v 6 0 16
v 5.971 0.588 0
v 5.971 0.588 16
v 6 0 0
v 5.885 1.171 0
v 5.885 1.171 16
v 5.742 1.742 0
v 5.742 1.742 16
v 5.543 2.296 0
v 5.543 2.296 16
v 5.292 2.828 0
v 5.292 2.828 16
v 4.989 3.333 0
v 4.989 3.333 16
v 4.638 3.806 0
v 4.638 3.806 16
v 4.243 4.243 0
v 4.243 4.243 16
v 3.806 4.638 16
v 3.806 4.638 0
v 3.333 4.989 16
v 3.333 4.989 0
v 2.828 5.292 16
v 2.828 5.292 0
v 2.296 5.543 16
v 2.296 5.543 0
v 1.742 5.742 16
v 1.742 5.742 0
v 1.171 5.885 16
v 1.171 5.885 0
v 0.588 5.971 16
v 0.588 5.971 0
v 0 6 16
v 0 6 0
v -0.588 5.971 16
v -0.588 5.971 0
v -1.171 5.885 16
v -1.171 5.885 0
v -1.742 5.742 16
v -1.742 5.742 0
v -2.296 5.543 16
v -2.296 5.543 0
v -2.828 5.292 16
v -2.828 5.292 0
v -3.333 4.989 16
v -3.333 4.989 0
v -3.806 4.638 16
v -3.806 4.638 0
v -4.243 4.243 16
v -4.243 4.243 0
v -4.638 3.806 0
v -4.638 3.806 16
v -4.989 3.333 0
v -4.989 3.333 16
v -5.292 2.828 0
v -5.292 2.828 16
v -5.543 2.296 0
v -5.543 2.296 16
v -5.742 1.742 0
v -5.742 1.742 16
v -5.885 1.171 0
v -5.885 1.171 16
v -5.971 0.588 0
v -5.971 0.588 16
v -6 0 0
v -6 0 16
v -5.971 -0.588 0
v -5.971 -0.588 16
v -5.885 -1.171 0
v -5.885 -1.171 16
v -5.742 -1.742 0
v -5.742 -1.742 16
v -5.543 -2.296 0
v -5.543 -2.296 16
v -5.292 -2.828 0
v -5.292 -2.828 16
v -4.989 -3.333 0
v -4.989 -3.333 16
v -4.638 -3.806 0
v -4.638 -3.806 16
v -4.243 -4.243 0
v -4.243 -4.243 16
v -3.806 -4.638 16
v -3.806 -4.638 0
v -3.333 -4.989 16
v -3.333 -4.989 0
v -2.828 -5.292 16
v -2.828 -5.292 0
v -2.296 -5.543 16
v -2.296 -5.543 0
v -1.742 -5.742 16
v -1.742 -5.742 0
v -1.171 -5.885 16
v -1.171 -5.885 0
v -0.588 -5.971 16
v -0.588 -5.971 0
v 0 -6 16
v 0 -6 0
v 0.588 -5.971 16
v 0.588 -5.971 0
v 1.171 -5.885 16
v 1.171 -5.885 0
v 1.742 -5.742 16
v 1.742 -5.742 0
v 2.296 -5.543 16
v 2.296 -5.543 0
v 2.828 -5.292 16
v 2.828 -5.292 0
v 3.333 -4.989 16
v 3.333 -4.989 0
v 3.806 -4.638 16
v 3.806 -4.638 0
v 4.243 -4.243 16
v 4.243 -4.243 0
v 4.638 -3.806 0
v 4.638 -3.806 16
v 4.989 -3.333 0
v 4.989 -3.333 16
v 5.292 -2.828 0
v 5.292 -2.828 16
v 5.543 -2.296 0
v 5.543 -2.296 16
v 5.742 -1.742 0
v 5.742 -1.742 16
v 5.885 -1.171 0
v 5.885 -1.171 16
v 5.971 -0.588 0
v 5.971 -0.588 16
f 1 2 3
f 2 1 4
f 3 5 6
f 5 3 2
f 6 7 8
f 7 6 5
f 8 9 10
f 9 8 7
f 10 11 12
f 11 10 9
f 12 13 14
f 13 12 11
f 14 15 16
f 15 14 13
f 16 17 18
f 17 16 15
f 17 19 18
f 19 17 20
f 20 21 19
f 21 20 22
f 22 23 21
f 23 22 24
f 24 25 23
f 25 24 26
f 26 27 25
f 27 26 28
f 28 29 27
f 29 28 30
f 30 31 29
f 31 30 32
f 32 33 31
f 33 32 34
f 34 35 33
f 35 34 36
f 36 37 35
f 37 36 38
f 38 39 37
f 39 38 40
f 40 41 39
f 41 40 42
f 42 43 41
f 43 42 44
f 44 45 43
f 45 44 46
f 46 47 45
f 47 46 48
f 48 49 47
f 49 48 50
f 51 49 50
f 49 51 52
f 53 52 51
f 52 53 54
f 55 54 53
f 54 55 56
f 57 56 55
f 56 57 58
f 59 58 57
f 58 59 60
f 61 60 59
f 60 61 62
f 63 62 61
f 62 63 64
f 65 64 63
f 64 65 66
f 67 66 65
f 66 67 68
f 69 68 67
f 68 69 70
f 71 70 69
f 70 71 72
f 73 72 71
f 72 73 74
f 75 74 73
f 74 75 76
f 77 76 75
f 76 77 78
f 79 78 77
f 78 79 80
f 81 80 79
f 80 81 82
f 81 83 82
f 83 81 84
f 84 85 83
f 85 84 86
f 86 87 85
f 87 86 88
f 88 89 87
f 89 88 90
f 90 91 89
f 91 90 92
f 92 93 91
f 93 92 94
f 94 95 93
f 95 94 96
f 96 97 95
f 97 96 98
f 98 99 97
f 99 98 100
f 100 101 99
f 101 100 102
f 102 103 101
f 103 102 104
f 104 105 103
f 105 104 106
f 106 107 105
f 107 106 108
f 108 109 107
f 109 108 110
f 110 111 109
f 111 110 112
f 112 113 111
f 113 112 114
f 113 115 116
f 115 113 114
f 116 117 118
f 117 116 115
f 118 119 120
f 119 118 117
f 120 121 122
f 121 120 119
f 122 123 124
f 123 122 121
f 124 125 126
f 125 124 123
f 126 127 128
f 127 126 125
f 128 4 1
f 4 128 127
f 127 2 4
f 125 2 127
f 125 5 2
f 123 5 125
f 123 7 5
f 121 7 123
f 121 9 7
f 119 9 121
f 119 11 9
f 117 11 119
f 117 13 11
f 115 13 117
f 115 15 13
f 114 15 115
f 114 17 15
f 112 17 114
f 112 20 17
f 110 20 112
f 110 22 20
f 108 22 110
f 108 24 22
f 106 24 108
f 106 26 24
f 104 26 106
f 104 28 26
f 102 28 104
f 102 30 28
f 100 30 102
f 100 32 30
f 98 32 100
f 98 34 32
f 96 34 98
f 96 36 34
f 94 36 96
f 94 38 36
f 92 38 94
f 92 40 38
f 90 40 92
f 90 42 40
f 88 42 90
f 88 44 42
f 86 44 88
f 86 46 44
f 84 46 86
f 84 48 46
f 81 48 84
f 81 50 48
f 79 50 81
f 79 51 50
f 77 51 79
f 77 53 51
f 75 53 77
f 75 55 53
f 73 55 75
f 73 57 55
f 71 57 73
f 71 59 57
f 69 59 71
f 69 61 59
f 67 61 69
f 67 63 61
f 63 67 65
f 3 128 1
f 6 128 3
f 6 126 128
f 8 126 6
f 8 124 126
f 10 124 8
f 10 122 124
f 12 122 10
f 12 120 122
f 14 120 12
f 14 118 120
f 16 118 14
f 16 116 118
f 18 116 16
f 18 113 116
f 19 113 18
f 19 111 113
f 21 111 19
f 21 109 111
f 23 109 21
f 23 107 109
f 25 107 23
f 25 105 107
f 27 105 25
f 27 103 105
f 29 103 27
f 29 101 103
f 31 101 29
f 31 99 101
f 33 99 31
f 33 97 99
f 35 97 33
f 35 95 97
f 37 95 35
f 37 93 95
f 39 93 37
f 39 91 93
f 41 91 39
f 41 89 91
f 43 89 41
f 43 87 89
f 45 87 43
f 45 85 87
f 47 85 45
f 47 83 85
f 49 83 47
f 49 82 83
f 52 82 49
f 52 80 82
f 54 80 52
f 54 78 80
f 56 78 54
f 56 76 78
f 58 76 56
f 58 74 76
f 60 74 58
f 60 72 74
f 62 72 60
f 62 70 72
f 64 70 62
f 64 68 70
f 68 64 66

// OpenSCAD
$fn = 64;
// Missing flange and through-hole: only a plain 12x16 cylinder.
cylinder(h = 16, d = 12);
